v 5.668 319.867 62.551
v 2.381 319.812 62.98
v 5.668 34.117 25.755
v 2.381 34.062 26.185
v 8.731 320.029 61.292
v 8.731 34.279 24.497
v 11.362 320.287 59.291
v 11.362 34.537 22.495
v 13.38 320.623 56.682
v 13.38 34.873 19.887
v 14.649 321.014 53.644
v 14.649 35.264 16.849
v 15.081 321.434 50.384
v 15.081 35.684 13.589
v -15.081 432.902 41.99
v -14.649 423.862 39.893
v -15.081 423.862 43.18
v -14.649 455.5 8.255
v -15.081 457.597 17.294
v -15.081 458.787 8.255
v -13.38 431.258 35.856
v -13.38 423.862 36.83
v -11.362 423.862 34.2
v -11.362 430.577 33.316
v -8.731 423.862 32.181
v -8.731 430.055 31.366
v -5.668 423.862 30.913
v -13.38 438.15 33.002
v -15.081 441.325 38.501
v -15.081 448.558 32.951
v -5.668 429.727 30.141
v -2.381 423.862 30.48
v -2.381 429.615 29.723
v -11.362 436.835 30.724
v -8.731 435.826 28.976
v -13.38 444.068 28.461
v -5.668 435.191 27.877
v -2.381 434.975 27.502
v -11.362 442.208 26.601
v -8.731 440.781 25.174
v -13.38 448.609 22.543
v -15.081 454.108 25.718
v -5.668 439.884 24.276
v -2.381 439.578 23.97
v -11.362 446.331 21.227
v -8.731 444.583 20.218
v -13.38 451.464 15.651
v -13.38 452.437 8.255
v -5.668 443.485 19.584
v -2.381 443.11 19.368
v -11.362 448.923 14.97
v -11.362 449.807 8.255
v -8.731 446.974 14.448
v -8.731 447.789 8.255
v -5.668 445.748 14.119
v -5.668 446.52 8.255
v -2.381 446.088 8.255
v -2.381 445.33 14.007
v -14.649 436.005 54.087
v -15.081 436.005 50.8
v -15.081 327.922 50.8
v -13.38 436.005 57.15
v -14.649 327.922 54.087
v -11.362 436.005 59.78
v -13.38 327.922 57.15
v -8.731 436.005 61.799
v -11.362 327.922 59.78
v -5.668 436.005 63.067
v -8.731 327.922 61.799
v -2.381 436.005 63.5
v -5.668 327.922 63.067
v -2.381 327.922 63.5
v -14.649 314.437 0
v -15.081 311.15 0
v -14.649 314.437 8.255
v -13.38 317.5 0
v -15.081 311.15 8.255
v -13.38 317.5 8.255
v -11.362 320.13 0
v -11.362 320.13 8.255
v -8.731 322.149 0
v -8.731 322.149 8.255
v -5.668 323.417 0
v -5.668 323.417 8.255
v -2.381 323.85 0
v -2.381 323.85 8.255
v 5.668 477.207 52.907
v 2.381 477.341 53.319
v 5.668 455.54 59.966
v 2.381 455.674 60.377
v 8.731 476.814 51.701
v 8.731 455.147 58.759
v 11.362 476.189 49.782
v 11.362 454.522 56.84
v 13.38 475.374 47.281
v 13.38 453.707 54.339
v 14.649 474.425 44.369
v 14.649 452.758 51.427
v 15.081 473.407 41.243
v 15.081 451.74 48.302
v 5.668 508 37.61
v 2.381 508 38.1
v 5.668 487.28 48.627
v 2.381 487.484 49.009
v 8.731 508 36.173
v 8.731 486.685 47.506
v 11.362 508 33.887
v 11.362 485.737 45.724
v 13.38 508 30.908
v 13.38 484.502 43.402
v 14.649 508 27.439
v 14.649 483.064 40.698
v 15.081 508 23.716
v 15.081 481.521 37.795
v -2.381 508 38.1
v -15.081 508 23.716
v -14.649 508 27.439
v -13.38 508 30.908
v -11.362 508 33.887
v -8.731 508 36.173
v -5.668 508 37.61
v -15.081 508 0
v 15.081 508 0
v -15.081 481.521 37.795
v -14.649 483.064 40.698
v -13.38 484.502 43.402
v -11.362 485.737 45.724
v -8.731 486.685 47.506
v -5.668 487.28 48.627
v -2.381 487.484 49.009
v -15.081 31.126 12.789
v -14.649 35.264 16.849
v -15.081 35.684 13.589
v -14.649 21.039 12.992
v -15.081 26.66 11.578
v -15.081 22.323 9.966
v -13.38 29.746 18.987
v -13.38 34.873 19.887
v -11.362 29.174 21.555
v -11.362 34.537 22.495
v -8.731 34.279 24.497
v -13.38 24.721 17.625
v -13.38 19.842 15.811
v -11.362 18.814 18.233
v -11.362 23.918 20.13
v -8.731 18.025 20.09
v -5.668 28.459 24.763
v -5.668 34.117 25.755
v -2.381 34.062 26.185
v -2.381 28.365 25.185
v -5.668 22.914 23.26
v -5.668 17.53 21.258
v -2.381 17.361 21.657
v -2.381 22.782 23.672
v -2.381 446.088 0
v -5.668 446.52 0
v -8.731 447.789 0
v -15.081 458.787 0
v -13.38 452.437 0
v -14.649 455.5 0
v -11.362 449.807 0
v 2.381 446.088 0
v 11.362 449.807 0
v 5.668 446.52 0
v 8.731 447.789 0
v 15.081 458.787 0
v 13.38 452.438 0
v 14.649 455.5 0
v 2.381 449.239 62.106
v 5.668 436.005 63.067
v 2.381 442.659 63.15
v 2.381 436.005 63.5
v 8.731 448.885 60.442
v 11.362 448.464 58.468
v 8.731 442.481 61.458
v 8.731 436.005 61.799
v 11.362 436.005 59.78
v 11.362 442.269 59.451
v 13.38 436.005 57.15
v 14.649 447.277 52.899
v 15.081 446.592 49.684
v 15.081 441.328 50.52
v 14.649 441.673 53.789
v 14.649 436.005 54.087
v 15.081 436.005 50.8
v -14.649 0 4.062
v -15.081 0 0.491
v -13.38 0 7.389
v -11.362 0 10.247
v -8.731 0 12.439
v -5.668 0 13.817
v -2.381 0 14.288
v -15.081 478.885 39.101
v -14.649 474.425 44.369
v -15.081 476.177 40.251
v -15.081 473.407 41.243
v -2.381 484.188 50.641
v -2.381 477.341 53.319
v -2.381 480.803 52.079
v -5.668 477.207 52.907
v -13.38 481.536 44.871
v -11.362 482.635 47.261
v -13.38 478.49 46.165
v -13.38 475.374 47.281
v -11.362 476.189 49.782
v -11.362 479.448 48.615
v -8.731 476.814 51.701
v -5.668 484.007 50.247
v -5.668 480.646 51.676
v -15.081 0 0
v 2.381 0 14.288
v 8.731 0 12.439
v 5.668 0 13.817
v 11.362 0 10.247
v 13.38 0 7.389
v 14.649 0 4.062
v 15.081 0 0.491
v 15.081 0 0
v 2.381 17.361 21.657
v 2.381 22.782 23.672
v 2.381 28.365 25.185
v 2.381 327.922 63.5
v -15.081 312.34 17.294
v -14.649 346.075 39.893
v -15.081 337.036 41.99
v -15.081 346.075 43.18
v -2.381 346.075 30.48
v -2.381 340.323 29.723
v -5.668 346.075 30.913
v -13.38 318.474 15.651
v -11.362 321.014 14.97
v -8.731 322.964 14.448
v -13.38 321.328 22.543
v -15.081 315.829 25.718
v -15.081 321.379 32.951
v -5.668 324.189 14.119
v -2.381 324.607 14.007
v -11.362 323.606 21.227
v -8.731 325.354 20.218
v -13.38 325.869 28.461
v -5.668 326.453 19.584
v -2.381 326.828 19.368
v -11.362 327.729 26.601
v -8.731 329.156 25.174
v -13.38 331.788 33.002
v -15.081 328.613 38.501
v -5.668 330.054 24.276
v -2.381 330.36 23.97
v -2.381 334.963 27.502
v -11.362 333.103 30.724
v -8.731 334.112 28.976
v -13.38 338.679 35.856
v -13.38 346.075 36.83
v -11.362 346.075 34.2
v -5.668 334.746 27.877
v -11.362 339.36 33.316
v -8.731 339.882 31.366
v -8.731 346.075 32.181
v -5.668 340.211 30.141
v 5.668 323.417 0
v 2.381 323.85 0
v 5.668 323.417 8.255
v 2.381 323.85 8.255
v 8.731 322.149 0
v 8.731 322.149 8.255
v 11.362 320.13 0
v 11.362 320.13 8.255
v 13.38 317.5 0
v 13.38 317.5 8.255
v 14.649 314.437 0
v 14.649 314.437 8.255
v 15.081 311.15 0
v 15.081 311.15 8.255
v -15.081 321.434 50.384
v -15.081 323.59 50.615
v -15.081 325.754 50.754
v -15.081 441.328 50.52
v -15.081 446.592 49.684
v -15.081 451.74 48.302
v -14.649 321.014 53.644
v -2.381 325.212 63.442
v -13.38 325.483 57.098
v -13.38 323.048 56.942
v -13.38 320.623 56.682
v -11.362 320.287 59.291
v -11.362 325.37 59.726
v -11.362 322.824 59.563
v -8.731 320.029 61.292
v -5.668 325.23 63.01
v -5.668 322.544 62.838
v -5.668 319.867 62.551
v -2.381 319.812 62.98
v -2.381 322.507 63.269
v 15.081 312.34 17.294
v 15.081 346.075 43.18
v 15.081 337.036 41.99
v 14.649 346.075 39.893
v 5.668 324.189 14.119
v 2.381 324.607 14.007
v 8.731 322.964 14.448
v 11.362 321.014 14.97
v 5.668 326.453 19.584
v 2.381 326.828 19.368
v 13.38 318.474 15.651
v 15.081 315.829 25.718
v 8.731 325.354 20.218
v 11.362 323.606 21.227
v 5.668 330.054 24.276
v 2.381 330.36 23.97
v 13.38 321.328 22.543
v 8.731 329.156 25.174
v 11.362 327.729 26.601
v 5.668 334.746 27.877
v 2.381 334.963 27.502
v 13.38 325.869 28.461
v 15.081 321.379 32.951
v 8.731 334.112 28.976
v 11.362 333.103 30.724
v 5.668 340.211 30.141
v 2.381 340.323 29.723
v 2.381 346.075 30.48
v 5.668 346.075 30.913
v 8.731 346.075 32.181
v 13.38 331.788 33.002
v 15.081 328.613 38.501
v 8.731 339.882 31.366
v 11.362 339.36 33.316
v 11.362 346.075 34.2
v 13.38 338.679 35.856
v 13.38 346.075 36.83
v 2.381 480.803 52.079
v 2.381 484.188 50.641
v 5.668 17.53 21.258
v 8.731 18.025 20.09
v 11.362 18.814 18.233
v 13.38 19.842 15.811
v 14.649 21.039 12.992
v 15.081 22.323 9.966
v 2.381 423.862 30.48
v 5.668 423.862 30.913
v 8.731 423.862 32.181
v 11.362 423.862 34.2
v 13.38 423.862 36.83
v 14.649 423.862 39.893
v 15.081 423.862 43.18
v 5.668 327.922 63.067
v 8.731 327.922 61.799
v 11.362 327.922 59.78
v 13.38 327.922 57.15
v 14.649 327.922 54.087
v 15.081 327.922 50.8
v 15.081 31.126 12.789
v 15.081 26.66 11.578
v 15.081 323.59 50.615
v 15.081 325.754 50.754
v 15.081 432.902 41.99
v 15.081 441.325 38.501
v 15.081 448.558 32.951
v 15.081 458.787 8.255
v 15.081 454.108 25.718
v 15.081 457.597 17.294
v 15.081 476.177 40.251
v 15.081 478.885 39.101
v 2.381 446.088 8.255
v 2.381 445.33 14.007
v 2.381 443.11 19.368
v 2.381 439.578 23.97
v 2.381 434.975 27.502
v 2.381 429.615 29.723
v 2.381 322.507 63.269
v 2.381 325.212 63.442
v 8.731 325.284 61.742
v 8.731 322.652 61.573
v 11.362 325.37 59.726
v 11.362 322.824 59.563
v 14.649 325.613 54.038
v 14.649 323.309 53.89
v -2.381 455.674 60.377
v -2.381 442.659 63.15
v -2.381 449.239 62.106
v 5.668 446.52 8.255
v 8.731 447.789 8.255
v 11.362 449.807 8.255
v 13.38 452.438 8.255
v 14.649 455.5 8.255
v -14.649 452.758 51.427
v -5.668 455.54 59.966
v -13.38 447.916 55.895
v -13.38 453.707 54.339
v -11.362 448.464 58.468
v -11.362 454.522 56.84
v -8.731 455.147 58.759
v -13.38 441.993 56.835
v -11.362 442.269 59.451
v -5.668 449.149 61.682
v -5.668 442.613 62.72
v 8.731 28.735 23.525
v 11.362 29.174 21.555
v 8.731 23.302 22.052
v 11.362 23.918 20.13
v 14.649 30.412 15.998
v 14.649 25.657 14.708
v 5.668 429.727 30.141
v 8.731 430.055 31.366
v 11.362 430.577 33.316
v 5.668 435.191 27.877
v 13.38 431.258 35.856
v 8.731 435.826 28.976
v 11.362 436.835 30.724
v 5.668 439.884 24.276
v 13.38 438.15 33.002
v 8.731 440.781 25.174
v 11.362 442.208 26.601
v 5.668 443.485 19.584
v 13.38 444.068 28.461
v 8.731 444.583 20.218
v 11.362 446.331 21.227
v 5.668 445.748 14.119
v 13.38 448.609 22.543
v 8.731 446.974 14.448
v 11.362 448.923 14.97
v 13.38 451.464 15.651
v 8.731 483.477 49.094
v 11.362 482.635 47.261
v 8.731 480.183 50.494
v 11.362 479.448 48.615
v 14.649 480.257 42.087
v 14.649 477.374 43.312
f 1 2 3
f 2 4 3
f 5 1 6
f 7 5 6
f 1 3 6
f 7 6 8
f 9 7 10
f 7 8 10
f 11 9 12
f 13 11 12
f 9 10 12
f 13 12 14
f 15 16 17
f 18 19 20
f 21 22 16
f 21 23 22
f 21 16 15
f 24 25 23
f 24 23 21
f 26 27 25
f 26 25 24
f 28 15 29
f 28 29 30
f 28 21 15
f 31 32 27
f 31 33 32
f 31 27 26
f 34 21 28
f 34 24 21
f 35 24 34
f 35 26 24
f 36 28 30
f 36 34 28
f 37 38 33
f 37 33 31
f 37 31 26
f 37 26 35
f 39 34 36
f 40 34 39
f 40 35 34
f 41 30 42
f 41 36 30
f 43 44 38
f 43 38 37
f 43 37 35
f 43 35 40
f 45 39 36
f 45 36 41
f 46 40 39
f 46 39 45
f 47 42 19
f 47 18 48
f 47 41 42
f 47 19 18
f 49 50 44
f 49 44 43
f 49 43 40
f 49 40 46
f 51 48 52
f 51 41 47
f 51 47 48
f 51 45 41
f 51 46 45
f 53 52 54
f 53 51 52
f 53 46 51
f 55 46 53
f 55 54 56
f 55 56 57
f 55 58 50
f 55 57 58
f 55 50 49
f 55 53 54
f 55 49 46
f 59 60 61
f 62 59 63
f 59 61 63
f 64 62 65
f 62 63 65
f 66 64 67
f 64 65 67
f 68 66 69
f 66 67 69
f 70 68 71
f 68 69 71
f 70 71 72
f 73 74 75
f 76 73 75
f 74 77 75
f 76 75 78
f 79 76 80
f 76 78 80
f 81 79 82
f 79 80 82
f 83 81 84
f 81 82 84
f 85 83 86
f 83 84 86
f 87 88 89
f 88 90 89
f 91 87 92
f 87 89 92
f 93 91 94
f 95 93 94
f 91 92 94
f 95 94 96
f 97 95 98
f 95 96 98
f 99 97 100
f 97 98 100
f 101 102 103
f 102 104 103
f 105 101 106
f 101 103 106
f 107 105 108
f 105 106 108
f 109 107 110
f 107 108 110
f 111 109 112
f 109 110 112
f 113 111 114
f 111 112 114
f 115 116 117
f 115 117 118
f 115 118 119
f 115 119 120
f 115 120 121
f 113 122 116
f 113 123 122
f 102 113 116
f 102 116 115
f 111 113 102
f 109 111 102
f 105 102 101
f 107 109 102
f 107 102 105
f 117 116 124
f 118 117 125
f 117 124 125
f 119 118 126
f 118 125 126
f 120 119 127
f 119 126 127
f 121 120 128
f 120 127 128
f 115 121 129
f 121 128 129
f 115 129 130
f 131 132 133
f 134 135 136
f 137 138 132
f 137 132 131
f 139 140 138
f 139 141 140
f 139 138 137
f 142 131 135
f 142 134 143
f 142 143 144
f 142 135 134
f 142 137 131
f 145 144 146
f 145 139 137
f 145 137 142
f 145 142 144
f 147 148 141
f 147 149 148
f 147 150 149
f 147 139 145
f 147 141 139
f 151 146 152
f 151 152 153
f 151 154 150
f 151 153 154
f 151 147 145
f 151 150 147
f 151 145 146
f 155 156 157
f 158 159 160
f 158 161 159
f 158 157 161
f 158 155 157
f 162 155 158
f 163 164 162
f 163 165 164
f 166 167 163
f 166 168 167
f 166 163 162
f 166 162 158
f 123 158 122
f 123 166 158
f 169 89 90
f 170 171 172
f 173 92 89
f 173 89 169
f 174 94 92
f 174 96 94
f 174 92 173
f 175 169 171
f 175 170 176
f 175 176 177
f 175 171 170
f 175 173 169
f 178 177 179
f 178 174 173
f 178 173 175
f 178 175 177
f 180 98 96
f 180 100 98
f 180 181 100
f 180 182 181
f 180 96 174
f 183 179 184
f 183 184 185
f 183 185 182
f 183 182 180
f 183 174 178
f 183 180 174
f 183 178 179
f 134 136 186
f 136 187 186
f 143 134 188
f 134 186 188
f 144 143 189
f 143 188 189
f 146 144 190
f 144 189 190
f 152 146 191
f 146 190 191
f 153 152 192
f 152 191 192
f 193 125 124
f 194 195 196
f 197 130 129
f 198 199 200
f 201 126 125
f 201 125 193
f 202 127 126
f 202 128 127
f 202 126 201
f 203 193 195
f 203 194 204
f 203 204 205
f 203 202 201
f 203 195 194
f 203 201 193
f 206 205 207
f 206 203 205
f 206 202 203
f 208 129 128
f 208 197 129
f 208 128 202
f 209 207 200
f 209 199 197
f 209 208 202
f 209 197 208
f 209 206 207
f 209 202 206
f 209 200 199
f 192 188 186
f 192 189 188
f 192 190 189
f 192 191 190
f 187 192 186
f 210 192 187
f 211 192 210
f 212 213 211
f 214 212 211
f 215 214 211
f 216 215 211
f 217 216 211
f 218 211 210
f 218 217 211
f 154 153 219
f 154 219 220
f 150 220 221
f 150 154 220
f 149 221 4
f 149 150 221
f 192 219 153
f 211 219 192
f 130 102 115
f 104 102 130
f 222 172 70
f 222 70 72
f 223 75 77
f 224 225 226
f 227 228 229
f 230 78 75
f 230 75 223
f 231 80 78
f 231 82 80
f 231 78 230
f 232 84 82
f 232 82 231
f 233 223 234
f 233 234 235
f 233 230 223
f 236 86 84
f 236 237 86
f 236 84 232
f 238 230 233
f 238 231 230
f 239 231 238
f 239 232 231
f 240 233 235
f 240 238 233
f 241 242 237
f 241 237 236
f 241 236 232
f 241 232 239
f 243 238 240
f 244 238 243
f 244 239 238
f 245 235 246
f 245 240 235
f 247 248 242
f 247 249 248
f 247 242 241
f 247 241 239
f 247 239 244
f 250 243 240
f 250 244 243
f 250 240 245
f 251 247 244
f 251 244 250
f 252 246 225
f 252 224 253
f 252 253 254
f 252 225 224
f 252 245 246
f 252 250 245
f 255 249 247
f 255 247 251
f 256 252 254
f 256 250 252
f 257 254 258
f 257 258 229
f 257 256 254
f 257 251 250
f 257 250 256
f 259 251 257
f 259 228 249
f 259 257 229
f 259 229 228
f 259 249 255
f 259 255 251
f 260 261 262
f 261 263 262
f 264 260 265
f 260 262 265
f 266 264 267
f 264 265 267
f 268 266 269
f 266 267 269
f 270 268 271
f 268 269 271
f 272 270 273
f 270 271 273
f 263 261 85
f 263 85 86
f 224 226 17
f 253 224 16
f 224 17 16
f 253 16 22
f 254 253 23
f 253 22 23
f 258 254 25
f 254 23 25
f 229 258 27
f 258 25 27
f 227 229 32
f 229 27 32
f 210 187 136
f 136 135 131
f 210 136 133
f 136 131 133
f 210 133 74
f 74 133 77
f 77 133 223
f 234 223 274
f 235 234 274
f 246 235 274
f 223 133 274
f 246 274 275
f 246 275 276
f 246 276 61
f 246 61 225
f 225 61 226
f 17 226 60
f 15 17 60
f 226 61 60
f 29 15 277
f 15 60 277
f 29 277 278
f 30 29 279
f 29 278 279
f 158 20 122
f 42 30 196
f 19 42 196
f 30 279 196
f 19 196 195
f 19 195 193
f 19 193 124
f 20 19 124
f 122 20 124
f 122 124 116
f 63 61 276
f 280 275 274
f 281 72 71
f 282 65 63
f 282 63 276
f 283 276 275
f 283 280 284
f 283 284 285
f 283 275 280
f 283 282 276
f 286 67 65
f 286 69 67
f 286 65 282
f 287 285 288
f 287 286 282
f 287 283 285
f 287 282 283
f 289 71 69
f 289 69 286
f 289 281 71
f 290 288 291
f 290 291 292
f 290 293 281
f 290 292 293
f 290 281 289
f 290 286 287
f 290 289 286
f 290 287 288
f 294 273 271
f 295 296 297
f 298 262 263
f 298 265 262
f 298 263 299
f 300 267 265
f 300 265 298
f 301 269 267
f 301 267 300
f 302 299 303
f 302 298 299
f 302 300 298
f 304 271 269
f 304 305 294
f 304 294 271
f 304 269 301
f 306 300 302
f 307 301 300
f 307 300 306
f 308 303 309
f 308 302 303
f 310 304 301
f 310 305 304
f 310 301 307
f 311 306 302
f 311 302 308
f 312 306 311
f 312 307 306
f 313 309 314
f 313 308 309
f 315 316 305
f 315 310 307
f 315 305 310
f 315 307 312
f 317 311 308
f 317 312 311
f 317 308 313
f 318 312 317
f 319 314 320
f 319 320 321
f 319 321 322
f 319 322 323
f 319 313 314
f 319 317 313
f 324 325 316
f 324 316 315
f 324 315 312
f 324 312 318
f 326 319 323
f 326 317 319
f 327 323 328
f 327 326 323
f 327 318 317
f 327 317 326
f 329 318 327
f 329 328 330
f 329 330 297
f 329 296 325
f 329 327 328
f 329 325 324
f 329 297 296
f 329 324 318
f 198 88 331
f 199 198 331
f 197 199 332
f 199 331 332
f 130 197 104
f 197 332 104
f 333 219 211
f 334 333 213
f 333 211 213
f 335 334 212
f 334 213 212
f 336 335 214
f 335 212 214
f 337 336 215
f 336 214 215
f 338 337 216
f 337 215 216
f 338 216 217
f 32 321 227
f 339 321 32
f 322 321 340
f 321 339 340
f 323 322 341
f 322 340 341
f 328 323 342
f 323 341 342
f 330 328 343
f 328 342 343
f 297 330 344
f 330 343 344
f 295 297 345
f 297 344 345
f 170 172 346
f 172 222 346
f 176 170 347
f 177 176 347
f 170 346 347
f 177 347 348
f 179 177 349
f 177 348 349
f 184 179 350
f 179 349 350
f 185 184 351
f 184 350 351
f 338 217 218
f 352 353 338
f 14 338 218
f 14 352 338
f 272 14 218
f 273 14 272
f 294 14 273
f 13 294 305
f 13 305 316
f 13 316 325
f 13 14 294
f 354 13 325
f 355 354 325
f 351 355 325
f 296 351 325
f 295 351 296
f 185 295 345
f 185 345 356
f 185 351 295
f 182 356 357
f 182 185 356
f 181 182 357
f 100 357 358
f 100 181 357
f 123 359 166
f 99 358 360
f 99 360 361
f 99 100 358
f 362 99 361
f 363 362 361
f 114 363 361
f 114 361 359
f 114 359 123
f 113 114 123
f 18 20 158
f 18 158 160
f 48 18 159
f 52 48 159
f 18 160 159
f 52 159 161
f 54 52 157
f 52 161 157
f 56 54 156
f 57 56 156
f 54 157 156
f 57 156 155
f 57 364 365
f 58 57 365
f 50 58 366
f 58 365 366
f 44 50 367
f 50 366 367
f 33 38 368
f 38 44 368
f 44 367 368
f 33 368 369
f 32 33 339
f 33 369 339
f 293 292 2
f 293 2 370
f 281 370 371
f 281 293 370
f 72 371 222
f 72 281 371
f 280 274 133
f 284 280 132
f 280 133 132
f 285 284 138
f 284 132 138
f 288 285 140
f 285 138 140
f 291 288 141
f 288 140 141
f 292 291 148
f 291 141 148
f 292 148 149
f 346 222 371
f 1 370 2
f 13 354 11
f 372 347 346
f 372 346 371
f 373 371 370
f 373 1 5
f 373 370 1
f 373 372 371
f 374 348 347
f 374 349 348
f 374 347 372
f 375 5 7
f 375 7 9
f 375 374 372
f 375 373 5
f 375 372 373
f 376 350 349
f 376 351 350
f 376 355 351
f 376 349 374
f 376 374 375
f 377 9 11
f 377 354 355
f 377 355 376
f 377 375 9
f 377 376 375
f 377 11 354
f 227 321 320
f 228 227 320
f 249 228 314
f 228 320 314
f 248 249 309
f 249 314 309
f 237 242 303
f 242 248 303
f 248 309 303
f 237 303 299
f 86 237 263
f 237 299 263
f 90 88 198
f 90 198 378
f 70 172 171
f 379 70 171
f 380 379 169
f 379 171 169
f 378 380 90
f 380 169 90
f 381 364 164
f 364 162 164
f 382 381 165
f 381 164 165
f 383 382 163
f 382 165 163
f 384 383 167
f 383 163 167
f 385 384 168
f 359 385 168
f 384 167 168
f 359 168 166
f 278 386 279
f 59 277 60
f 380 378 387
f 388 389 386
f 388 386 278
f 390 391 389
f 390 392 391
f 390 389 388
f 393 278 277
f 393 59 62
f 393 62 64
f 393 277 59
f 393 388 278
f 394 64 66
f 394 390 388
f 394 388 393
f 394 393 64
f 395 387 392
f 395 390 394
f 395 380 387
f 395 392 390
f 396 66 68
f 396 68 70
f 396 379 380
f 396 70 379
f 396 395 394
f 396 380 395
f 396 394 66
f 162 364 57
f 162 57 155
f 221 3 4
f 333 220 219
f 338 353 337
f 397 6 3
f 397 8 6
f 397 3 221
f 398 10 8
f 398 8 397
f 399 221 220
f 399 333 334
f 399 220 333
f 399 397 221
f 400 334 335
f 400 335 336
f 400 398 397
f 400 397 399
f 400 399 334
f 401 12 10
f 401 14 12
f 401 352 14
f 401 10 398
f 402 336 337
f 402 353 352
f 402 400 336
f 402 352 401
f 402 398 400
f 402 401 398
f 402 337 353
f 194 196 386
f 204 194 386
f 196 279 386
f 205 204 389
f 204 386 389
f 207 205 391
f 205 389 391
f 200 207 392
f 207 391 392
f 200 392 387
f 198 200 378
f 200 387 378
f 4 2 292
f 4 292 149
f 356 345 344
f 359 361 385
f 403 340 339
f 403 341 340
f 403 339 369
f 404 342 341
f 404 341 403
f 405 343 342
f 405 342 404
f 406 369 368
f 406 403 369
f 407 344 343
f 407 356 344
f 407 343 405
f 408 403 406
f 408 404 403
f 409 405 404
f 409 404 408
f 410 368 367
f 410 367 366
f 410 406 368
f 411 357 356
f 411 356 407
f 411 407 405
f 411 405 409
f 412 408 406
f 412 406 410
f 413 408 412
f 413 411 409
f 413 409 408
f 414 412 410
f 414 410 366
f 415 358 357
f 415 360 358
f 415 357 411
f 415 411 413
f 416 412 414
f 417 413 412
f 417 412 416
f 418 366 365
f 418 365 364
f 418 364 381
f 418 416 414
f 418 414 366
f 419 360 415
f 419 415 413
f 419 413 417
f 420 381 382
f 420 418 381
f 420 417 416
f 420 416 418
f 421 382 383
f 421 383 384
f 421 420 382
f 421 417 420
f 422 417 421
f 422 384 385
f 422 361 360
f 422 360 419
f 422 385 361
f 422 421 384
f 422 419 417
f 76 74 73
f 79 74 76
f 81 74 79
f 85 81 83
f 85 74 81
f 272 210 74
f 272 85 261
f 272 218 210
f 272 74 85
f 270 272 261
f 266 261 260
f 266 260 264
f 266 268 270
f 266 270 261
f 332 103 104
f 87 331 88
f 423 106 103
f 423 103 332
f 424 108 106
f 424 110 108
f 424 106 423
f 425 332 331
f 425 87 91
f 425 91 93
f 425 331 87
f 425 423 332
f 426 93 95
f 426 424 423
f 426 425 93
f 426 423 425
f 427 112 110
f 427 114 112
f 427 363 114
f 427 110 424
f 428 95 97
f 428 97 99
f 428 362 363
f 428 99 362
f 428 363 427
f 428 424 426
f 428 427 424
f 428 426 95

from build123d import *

# Parameters (mm, degrees)
F1_DEPTH      = 15.08125
F1_DEPTH_BACK = 15.08125
F2_R          = 63.5
F3_R          = 22.225
F4_R          = 12.7


with BuildPart() as f1:
    # F0 (on Right) → F1 (new body, two sides)
    with BuildSketch(Plane.YZ) as f1_sk:
        Polygon((0, 14.2875), (0, 0), (323.85, 0), (323.85, 30.48), (446.0875, 30.48), (446.0875, 0), (508, 0), (508, 38.1), (482.6, 51.60542), (446.0875, 63.5), (323.85, 63.5), (25.4, 25.06916), align=None)
    extrude(amount=F1_DEPTH)
    extrude(f1_sk.sketch, amount=-F1_DEPTH_BACK)

    # F2
    f2_edges = [f1.edges().sort_by_distance(p)[0] for p in [
        (0, 25.4, 25.06916),
        (0, 323.85, 63.5),
        (0, 446.0875, 63.5),
        (0, 482.6, 51.60542),
    ]]
    fillet(f2_edges, radius=F2_R)

    # F3
    f3_edges = [f1.edges().sort_by_distance(p)[0] for p in [
        (0, 323.85, 30.48),
        (0, 446.0875, 30.48),
    ]]
    fillet(f3_edges, radius=F3_R)

    # F4
    f4_edges = [f1.edges().sort_by_distance(p)[0] for p in [
        (15.08125, 381.963359, 63.5),
        (-15.08125, 381.963359, 63.5),
        (15.08125, 384.96875, 30.48),
        (-15.08125, 384.96875, 30.48),
    ]]
    fillet(f4_edges, radius=F4_R)


solid = f1.part
